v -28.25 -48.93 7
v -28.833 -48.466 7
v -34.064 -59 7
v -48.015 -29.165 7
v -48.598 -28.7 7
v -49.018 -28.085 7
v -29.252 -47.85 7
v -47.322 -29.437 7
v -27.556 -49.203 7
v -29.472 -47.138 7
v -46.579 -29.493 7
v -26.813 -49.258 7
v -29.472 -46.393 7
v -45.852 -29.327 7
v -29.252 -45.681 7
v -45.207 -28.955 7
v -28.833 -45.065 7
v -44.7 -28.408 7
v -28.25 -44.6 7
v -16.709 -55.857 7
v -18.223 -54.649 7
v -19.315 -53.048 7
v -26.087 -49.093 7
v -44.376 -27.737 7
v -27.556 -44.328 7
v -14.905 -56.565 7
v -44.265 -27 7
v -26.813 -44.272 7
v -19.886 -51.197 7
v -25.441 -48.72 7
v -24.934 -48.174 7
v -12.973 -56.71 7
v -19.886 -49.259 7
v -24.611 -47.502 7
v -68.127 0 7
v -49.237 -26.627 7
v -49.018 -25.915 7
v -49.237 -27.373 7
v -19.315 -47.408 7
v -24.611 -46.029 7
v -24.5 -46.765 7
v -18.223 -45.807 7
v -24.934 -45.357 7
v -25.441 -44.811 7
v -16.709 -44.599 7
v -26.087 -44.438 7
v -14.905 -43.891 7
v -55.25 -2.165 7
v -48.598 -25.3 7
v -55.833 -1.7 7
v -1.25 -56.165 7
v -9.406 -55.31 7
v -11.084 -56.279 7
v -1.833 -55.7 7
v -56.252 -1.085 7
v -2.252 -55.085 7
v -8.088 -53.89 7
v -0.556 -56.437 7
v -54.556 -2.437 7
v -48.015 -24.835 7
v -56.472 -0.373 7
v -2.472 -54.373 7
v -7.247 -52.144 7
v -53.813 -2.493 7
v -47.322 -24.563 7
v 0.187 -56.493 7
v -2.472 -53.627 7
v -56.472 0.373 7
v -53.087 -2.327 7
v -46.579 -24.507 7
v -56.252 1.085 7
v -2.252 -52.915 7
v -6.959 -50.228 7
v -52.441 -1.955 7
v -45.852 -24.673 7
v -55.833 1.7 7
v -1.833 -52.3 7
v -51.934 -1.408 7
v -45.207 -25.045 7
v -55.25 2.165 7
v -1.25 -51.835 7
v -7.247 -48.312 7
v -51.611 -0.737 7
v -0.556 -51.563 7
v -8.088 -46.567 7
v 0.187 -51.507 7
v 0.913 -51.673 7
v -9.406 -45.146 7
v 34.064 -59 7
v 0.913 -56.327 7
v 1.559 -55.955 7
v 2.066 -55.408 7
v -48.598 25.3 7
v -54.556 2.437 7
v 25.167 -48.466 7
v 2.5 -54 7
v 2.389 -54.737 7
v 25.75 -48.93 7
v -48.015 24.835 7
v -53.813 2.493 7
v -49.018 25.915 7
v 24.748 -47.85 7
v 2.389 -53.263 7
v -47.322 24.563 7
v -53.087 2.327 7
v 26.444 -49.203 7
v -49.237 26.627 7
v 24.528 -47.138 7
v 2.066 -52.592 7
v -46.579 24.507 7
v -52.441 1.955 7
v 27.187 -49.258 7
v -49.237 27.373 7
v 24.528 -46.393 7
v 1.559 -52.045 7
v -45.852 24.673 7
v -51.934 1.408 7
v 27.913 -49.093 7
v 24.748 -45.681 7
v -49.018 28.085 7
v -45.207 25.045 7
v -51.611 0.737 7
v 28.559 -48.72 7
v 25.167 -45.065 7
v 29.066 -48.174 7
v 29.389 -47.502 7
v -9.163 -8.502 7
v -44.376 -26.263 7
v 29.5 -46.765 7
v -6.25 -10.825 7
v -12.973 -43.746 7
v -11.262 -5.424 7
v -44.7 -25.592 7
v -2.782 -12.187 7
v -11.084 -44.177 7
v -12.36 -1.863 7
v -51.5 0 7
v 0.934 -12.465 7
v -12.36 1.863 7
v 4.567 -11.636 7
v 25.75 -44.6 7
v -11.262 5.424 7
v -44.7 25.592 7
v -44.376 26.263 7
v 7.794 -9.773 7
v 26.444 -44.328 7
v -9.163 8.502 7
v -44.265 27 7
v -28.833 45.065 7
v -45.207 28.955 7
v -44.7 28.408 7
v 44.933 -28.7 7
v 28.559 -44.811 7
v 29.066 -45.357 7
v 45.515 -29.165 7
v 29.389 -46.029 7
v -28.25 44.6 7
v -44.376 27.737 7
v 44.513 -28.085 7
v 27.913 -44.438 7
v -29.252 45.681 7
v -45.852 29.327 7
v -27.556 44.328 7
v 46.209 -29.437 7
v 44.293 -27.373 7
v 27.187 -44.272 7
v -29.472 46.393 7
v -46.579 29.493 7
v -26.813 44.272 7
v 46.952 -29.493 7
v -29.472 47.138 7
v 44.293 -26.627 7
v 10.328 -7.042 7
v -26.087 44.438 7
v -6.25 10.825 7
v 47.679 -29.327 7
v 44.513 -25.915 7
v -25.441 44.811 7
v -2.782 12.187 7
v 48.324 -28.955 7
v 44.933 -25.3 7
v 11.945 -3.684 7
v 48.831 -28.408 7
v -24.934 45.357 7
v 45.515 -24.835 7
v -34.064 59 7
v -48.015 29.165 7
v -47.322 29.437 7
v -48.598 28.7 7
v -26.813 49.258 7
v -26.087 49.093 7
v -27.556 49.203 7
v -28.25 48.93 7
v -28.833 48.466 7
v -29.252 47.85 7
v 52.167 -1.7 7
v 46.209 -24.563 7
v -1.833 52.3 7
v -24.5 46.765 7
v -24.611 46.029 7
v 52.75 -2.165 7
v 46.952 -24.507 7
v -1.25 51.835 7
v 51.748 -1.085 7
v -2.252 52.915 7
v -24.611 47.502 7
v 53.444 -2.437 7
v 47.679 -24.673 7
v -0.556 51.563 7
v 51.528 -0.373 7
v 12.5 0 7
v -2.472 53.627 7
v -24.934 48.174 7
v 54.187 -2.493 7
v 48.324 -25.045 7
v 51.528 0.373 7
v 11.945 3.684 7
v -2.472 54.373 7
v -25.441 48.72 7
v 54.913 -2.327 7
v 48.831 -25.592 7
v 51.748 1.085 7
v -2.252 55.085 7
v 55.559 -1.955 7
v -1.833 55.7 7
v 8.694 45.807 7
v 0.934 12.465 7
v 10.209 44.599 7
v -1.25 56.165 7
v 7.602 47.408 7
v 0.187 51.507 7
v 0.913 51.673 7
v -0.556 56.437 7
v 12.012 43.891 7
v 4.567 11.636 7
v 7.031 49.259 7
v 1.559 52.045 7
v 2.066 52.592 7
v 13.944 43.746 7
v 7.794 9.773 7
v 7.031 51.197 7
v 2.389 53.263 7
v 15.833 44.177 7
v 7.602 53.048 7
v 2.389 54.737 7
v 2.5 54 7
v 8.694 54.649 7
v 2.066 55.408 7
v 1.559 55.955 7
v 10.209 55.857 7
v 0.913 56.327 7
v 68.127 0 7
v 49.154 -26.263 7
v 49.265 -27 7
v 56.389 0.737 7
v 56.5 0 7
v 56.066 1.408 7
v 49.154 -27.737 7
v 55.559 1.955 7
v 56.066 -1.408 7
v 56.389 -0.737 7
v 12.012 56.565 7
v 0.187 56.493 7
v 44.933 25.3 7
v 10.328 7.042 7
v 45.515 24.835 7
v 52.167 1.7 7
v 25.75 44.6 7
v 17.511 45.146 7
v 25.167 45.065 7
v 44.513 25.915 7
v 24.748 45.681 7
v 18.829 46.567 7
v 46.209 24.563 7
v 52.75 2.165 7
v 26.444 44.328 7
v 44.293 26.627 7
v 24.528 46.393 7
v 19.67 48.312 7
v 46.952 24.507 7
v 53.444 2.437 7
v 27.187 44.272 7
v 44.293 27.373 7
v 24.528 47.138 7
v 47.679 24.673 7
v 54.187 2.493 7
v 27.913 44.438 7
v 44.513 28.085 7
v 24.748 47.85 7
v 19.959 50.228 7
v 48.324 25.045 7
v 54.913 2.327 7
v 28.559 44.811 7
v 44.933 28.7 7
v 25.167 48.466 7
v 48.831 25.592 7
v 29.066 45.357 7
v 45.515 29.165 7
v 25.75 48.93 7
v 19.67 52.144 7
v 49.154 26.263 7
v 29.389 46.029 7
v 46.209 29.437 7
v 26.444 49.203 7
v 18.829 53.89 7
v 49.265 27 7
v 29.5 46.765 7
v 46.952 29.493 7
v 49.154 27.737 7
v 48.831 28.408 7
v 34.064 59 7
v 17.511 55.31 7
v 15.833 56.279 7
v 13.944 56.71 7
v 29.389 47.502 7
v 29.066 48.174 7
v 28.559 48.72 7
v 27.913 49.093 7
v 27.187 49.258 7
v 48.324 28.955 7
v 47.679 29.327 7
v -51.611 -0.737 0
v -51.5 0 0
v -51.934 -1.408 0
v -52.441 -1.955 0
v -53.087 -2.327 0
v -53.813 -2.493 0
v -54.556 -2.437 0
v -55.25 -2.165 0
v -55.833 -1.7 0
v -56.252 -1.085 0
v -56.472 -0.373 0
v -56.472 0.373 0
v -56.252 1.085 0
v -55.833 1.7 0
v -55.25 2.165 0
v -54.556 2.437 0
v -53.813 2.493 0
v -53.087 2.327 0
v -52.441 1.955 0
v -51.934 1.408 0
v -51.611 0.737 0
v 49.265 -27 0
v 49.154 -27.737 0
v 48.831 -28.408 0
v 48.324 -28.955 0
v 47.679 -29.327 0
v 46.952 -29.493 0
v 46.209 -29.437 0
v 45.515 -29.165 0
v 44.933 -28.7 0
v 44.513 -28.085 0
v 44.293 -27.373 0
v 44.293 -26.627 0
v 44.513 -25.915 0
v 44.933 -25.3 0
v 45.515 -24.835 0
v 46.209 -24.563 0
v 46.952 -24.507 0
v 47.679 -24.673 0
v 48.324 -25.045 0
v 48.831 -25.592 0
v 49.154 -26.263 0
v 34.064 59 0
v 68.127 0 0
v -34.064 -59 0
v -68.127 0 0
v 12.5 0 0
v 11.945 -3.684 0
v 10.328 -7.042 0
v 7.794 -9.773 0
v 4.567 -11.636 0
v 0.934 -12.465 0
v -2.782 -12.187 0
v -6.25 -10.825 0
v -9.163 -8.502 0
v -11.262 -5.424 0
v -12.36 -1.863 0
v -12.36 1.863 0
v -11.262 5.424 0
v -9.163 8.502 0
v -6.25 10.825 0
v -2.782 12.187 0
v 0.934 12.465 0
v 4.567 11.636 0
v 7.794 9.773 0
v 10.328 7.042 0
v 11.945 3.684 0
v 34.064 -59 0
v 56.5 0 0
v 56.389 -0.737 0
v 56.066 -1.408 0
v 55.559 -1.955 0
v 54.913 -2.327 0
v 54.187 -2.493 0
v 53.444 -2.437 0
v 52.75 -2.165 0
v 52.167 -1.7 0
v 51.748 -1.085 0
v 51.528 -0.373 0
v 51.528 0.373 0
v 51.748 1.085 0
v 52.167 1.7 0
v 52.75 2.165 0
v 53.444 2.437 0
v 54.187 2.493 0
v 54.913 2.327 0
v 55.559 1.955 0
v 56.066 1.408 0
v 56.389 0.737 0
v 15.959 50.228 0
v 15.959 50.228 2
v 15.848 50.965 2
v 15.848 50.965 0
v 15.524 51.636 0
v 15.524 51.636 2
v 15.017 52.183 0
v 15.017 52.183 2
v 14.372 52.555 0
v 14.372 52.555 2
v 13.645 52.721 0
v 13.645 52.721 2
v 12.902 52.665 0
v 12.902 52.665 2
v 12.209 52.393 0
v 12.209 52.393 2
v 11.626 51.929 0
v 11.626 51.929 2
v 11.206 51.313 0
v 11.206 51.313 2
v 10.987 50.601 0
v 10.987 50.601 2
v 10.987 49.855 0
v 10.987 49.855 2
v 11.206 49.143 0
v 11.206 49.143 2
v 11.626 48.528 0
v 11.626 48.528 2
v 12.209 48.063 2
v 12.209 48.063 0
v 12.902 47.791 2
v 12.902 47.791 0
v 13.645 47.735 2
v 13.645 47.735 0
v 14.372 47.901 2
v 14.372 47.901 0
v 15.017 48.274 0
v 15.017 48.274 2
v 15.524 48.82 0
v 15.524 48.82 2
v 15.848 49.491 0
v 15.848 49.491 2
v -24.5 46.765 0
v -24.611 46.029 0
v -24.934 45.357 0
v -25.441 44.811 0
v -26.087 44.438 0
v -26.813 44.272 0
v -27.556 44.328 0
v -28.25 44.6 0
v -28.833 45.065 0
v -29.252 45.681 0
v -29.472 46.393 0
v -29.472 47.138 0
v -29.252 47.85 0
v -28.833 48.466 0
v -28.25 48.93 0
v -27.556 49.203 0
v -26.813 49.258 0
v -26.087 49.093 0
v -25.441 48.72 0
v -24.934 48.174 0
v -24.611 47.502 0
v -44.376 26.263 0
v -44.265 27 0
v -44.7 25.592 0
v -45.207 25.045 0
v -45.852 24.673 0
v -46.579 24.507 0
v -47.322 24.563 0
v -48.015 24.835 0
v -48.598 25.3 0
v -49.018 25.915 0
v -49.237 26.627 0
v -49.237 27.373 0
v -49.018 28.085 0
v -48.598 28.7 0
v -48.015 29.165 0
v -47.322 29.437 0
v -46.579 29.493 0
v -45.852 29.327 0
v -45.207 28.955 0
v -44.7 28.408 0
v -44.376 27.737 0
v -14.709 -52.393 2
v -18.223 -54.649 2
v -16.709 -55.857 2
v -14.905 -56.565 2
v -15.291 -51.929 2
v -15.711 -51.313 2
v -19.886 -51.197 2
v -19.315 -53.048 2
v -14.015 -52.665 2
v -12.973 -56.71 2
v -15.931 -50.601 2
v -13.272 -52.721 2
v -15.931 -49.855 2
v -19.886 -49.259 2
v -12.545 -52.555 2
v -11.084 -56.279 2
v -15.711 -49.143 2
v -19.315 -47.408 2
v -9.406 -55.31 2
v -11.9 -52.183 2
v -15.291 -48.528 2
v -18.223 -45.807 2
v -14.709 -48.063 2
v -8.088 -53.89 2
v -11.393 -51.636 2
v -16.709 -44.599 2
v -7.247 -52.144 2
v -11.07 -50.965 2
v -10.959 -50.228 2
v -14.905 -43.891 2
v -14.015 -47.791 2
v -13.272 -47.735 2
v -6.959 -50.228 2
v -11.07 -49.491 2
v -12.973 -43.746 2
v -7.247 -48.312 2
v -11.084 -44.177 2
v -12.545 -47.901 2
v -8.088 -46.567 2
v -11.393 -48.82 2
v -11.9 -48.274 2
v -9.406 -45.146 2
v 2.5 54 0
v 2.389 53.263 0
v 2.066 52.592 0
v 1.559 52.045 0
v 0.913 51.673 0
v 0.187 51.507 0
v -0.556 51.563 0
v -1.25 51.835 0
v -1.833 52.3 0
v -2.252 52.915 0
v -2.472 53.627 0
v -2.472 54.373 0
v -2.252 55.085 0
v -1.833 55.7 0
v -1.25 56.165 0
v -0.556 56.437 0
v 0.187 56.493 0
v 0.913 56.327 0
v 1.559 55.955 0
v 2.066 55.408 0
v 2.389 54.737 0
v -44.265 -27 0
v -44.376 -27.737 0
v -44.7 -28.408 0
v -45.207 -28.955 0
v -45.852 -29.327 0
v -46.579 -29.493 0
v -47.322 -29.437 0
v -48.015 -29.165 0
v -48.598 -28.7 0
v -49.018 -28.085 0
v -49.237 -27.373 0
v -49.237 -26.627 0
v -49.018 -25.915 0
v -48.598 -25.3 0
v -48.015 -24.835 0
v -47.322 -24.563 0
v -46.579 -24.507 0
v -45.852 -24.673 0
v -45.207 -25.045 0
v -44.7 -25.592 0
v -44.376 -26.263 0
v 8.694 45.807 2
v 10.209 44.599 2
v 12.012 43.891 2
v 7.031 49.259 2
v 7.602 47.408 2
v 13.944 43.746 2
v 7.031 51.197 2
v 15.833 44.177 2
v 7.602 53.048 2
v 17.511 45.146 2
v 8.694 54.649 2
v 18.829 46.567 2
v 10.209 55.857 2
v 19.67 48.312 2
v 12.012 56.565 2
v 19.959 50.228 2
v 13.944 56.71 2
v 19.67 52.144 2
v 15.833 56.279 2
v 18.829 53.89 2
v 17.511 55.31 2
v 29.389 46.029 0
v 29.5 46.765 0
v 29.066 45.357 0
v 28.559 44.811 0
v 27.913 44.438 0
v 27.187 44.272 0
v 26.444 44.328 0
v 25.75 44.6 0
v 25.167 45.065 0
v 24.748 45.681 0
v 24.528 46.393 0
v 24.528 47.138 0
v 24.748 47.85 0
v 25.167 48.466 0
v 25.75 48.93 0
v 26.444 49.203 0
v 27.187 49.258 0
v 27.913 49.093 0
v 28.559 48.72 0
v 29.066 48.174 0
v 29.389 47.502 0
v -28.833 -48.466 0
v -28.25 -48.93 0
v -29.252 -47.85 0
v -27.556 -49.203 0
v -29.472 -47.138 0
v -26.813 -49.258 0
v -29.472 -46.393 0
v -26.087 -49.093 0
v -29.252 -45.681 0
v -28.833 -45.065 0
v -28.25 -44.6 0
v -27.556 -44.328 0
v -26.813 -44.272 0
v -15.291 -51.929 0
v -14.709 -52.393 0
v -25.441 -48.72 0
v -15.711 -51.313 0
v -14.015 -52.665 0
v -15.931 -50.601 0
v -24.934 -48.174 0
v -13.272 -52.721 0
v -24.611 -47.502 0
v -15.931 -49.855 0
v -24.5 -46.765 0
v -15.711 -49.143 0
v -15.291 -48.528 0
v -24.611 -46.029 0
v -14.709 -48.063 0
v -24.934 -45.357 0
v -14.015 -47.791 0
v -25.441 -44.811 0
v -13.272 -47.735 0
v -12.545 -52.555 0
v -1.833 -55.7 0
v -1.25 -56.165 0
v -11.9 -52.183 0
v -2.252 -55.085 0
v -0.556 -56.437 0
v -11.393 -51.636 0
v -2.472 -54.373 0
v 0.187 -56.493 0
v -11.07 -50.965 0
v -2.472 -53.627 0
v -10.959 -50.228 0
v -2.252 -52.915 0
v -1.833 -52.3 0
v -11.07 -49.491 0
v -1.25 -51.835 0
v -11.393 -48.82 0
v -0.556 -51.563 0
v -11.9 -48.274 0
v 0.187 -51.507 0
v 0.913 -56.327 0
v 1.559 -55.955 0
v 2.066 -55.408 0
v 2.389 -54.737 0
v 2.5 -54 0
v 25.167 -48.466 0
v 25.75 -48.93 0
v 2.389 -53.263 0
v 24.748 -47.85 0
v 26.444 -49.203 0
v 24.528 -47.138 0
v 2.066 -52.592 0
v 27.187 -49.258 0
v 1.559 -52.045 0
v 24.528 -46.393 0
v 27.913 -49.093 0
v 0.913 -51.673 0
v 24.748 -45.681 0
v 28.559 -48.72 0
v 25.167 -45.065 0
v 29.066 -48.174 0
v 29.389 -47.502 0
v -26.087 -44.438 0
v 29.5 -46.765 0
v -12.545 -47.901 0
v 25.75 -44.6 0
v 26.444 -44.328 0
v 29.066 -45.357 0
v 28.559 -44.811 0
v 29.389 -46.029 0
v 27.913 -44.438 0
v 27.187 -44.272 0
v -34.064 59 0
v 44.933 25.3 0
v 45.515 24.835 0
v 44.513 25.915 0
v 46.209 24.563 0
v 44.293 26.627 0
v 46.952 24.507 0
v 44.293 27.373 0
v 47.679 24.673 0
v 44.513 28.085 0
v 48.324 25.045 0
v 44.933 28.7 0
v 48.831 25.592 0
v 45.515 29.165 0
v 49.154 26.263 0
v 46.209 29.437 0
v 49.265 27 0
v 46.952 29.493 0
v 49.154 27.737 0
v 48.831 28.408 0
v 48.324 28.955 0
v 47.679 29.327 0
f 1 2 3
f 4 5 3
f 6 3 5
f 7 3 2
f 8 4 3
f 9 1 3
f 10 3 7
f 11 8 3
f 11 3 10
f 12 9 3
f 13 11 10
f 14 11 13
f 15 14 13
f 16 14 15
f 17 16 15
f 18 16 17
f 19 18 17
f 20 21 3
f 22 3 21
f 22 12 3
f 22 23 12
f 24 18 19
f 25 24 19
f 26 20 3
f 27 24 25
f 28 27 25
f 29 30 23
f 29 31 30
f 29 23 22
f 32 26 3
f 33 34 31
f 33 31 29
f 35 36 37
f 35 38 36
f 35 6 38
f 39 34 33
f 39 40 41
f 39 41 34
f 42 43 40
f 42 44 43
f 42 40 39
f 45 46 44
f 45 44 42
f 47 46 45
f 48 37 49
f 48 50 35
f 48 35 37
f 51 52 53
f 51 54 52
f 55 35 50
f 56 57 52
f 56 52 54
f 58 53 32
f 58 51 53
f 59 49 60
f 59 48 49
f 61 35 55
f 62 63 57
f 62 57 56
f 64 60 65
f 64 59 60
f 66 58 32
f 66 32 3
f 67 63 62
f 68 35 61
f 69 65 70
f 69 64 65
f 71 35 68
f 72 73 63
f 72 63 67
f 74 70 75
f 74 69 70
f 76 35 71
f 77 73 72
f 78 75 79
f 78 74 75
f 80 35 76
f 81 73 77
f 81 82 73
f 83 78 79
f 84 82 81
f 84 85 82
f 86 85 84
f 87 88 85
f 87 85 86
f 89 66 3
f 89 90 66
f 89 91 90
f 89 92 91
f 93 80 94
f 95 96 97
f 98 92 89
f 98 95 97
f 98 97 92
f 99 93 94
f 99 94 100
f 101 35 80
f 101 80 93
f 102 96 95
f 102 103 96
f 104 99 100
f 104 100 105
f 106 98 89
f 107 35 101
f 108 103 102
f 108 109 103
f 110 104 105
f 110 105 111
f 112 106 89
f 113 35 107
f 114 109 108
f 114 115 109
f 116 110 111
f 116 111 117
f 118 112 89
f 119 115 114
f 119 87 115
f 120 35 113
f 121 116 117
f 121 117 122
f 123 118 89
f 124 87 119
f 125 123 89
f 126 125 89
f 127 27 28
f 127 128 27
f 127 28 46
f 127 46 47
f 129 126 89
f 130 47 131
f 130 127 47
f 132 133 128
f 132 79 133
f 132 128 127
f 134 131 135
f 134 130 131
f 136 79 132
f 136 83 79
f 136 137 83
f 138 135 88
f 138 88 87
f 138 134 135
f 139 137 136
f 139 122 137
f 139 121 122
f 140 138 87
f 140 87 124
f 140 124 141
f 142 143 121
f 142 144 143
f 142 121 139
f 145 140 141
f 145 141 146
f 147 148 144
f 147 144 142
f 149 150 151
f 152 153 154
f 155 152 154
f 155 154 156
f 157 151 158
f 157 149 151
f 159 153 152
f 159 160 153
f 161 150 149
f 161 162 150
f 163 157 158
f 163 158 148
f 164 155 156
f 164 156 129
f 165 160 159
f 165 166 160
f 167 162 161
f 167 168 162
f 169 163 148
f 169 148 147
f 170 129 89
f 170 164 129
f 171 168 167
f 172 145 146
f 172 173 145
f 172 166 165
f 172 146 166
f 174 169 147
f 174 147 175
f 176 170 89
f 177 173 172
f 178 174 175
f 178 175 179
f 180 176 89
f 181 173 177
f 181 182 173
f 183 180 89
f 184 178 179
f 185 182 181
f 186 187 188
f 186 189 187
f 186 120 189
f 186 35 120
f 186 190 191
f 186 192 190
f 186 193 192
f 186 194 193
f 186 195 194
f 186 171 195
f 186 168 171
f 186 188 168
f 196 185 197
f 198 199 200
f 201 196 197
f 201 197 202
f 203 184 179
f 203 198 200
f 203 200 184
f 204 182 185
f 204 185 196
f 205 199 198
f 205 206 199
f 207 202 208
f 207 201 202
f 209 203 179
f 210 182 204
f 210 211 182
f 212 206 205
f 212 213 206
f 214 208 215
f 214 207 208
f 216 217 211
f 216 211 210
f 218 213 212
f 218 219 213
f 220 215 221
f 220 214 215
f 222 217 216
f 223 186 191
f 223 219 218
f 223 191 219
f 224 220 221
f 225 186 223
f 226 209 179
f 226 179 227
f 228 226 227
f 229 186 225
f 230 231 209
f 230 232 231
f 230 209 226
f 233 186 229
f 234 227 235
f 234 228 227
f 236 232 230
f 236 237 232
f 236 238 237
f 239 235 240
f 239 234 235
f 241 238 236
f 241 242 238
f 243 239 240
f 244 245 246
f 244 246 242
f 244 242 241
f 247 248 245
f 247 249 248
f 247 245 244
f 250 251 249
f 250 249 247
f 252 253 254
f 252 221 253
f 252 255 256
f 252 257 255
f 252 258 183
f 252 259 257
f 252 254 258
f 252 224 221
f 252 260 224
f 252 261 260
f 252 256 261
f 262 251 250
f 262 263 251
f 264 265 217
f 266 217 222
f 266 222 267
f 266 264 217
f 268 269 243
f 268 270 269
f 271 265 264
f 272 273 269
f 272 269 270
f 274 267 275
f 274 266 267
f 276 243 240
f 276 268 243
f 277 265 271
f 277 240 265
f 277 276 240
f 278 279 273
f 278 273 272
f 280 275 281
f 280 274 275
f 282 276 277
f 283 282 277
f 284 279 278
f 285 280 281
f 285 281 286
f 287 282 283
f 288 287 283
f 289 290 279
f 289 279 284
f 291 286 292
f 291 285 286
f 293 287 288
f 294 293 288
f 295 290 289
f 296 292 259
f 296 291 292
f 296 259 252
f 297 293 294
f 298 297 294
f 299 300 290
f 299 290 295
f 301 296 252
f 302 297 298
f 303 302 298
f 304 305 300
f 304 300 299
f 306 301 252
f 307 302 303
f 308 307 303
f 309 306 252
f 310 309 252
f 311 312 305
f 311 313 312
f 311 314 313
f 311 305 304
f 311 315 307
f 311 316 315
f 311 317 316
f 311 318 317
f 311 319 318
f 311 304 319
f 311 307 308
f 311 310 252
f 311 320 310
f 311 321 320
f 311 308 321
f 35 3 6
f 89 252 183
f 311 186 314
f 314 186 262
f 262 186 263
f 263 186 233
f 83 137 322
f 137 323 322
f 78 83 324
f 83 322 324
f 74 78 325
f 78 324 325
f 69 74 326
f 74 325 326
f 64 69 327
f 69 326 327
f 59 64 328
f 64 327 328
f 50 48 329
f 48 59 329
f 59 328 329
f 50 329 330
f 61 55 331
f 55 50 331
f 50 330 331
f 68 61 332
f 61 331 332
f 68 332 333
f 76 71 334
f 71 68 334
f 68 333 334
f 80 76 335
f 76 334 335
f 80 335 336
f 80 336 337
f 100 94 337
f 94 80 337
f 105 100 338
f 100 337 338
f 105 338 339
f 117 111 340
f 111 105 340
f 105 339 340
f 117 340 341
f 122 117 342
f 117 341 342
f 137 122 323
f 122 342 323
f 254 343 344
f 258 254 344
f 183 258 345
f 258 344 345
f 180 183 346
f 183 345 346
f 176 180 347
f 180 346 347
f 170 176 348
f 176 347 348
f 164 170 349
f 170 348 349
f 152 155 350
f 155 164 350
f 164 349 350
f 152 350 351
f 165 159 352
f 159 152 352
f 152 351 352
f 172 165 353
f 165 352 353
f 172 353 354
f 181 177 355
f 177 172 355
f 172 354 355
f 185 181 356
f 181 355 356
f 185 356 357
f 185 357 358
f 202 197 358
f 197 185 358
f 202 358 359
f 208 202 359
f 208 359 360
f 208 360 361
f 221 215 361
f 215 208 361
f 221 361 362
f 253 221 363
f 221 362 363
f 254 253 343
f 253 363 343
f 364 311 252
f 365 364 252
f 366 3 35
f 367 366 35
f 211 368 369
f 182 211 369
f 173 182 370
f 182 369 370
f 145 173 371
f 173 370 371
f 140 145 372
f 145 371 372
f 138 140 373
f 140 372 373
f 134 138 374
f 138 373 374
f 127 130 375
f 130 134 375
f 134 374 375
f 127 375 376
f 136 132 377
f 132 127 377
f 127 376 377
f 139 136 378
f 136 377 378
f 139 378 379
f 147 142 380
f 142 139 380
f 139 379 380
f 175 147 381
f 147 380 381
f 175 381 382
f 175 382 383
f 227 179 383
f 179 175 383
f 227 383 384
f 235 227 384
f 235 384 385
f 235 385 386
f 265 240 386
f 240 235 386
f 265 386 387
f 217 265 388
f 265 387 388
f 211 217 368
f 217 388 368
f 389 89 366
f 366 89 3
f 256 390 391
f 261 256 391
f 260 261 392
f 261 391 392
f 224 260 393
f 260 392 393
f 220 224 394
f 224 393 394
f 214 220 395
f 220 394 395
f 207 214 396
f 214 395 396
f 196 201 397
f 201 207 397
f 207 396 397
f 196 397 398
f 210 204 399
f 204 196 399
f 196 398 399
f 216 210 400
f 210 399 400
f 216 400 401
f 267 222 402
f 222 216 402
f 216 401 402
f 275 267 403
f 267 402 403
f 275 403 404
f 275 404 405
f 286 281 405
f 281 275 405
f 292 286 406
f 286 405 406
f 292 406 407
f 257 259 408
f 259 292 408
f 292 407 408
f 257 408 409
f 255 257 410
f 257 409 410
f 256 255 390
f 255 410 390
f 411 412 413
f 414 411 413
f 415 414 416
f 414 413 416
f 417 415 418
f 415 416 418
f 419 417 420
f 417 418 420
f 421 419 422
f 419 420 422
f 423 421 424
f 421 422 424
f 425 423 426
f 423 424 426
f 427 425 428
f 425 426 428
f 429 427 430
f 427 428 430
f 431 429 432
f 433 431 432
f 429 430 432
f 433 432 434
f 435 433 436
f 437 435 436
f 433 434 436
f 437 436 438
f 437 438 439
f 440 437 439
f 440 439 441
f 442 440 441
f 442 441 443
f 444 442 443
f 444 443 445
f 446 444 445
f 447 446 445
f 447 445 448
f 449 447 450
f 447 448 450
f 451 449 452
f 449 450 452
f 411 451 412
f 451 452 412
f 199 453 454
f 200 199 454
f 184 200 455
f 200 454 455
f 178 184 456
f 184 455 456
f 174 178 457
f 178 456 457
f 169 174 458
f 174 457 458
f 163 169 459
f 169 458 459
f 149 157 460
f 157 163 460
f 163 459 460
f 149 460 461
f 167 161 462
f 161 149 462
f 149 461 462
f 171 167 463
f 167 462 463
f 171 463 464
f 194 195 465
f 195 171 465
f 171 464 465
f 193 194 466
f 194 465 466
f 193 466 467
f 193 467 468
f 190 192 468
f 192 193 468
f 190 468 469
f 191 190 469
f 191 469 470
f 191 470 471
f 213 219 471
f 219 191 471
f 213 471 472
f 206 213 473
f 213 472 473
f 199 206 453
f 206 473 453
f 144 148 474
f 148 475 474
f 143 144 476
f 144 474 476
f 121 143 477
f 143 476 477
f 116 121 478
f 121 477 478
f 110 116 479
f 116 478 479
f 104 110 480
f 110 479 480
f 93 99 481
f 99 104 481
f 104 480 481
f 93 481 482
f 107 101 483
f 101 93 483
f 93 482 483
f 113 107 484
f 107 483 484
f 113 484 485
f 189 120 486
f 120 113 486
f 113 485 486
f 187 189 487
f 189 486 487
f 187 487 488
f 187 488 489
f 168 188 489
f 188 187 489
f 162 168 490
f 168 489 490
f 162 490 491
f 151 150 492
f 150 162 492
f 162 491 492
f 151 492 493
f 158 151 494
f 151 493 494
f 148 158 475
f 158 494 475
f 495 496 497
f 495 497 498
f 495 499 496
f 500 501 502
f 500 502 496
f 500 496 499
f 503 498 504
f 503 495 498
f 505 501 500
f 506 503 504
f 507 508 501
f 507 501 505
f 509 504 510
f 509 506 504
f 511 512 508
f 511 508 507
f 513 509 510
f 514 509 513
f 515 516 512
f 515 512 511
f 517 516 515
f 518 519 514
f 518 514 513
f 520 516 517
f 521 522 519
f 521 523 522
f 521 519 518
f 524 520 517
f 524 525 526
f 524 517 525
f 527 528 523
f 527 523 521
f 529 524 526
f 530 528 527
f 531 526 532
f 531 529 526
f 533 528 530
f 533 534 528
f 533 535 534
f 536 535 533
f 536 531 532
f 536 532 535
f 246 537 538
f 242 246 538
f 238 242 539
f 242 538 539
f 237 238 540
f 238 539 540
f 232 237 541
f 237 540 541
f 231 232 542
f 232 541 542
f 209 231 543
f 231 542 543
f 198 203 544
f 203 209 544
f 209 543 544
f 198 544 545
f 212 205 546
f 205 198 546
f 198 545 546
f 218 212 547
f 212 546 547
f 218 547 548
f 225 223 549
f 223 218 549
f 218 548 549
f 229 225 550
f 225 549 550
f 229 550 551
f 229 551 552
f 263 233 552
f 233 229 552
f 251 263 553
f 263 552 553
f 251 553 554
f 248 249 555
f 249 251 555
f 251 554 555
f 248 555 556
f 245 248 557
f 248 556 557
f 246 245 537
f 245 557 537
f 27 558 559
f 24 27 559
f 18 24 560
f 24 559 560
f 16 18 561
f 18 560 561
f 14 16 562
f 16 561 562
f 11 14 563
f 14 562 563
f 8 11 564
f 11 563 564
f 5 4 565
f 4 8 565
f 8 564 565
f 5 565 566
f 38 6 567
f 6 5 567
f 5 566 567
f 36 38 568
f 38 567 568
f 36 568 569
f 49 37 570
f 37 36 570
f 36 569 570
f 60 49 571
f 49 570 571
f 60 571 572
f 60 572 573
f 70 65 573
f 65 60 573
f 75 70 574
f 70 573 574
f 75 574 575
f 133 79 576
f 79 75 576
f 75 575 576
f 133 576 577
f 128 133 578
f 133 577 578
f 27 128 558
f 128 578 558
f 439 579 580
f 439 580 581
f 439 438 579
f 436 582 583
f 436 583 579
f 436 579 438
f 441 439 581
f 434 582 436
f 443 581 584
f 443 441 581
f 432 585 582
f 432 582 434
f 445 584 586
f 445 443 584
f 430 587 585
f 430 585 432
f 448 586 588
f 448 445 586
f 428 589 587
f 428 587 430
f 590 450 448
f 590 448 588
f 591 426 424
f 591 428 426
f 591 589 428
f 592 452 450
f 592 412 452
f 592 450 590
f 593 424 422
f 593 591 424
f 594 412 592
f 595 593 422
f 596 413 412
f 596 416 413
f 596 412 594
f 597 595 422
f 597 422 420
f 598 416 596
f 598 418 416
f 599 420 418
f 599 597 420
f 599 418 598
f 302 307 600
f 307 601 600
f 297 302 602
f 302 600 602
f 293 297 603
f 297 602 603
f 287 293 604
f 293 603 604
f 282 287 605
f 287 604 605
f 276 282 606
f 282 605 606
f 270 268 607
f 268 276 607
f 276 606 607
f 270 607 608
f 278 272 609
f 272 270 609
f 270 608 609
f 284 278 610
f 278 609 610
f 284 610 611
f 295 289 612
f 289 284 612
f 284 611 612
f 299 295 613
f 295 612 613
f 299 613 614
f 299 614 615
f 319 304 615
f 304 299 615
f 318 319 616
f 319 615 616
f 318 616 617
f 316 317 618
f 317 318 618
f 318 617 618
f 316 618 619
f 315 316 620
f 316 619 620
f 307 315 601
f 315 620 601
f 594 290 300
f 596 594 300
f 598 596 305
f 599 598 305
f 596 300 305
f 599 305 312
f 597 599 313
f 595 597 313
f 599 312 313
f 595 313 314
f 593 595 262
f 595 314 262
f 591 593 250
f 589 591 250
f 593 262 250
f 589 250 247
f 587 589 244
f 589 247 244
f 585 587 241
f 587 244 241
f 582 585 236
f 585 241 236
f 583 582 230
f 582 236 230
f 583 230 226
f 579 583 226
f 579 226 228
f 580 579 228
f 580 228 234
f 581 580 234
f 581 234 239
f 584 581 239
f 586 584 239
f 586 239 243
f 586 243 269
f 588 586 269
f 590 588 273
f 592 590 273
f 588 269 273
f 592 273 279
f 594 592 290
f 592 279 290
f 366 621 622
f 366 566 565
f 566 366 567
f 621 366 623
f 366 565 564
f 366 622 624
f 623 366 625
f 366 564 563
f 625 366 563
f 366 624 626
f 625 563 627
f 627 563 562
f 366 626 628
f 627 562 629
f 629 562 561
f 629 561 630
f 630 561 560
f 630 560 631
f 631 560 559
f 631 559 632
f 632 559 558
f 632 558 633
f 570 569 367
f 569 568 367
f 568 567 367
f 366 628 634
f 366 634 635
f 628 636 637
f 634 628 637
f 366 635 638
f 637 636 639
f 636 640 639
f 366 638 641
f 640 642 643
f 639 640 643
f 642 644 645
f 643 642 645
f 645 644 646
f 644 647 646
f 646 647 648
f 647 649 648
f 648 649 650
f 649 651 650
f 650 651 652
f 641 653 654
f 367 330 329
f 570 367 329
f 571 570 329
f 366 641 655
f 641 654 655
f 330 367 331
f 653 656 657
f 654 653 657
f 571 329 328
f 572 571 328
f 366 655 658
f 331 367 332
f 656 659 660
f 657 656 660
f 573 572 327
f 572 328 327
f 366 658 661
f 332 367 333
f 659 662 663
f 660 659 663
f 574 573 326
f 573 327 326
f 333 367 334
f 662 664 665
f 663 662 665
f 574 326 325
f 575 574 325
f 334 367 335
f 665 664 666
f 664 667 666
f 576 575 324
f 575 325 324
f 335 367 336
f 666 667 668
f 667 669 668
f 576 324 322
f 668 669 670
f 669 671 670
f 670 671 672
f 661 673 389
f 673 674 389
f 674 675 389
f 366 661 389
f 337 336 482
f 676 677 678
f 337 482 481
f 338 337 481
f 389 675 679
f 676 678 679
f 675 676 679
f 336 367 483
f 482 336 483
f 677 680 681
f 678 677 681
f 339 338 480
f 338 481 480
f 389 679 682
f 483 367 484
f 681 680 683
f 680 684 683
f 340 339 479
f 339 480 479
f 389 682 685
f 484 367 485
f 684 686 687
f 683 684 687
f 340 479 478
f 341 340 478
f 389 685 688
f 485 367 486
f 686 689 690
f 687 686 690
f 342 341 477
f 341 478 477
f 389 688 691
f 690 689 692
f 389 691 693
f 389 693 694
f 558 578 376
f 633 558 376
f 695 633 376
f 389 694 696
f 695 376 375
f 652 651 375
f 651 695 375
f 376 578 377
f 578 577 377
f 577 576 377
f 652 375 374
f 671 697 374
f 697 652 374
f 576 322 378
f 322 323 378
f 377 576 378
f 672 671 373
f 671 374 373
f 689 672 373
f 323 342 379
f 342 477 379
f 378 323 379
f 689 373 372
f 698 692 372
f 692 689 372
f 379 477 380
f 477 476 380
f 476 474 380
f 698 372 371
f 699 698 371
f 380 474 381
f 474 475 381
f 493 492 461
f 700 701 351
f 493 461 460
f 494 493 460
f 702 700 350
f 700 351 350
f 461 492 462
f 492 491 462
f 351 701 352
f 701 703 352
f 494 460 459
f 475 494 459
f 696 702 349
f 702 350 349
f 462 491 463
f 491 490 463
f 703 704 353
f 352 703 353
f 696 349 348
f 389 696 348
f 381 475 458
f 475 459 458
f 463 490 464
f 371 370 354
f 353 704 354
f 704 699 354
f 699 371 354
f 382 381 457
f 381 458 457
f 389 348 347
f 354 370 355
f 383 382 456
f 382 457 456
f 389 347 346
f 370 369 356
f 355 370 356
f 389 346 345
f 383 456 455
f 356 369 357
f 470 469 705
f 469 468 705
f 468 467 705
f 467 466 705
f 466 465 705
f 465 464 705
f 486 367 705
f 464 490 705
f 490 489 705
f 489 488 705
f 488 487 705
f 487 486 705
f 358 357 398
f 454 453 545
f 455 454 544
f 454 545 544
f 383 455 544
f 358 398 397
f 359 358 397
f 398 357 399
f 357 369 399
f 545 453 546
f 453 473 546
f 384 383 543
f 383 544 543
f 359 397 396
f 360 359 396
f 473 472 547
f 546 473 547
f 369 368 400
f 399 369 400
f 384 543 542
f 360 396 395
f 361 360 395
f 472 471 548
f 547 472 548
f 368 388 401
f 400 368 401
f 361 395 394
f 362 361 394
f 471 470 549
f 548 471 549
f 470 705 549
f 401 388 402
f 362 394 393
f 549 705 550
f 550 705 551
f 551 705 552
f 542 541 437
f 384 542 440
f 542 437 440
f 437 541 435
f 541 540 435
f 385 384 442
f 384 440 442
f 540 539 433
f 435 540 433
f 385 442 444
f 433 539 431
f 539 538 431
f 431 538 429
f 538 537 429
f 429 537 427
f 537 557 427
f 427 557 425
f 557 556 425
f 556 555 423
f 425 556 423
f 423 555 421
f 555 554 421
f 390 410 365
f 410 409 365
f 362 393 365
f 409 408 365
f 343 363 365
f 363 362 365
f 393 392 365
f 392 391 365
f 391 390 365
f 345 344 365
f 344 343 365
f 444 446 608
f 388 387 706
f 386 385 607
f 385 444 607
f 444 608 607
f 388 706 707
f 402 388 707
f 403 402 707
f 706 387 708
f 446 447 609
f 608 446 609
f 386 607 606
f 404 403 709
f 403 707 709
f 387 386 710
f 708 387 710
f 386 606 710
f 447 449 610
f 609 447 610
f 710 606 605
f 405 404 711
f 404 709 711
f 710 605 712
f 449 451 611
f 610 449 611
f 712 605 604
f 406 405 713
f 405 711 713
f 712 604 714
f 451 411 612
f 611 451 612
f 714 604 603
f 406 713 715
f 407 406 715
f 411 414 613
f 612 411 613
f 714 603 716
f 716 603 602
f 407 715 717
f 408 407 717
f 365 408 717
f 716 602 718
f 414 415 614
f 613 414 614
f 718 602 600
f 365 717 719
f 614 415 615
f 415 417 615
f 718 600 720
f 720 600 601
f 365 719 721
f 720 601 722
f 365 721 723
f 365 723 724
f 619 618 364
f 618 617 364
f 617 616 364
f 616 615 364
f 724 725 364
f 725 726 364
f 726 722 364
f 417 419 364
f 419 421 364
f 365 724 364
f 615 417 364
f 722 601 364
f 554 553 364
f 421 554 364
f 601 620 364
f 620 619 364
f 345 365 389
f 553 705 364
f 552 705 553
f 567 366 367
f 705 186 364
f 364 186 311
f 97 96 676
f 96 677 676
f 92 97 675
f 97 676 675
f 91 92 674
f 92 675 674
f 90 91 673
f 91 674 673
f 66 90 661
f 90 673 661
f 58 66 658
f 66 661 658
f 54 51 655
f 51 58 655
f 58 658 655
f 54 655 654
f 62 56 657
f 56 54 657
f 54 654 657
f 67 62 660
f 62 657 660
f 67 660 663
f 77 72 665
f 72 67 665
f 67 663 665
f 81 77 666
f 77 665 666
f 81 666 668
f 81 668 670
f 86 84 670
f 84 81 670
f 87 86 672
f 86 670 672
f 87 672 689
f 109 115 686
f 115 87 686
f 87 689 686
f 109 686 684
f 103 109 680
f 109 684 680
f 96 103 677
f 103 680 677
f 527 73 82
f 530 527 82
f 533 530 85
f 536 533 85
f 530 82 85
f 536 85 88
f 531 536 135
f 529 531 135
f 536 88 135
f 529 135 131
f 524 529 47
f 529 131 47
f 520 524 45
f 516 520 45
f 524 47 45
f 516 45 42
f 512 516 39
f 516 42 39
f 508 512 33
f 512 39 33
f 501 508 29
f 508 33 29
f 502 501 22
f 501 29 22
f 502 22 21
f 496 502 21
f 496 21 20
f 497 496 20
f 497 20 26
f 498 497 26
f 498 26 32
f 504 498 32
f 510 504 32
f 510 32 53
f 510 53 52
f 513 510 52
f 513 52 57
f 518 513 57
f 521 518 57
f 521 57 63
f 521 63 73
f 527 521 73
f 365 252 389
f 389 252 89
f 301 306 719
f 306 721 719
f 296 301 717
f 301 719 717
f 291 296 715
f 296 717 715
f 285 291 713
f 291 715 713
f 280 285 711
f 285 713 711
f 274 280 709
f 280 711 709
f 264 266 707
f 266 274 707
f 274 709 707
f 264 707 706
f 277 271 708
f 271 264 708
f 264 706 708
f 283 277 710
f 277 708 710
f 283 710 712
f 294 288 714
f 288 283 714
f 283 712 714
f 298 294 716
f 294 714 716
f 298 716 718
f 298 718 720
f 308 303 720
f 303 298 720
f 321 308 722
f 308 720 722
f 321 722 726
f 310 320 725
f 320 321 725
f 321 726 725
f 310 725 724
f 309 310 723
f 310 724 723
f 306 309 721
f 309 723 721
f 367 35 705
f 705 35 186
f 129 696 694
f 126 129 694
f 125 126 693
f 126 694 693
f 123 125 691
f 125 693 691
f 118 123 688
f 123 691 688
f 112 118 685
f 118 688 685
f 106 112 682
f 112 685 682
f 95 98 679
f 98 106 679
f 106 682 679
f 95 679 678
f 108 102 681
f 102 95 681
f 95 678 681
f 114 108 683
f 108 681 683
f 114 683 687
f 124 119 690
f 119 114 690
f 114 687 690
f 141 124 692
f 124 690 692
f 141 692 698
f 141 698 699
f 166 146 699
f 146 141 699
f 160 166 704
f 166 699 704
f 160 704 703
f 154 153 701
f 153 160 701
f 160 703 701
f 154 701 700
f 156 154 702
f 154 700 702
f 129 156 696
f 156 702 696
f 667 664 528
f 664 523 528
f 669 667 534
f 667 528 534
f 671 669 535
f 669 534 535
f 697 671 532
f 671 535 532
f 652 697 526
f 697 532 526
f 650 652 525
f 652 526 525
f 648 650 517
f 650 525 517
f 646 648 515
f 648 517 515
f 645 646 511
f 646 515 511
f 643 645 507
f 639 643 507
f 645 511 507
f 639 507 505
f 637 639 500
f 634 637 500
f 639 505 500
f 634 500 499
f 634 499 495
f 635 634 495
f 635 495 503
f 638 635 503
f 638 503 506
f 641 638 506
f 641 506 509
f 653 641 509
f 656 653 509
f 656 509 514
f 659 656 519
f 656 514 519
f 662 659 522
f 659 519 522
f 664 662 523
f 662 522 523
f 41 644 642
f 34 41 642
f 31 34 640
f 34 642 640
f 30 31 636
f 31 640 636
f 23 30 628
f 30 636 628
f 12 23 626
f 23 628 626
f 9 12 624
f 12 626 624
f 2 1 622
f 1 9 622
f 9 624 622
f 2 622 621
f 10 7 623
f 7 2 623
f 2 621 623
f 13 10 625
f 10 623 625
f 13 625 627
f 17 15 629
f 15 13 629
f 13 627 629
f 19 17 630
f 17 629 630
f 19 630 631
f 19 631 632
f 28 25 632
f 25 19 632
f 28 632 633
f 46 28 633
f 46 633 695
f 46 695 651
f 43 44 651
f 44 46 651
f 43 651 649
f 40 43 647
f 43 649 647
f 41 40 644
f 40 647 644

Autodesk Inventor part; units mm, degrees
ref_plane "YZ Plane" through (0, 0, 0) normal (1, 0, 0) x (0, 1, 0)
ref_plane "XZ Plane" through (0, 0, 0) normal (0, 1, 0) x (-1, 0, 0)
ref_plane "XY Plane" through (0, 0, 0) normal (0, 0, 1) x (1, 0, 0)
sketch "Sketch1" plane through (0, 0, 0) normal (0, 0, 1) x (1, 0, 0)
  line L0 (77.9423, 0) -> (38.9711, -67.5)
  line L1 (38.9711, -67.5) -> (-38.9711, -67.5)
  line L2 (-38.9711, -67.5) -> (-77.9423, 0)
  line L3 (-77.9423, 0) -> (-38.9711, 67.5)
  line L4 (-38.9711, 67.5) -> (38.9711, 67.5)
  line L5 (38.9711, 67.5) -> (77.9423, 0)
  circle A0 centre (0, 0) radius 12.5
  circle A1 centre (54, 0) radius 2.5
  circle A2 centre (46.7654, 27) radius 2.5
  circle A3 centre (27, 46.7654) radius 2.5
  circle A4 centre (0, 54) radius 2.5
  circle A5 centre (-27, 46.7654) radius 2.5
  circle A6 centre (-46.7654, 27) radius 2.5
  circle A7 centre (-54, 0) radius 2.5
  circle A8 centre (-46.7654, -27) radius 2.5
  circle A9 centre (-27, -46.7654) radius 2.5
  circle A10 centre (0, -54) radius 2.5
  circle A11 centre (27, -46.7654) radius 2.5
  circle A12 centre (46.7654, -27) radius 2.5
  dimension "d0" = 135
  dimension "d1" = 25
  dimension "d2" = 54
  dimension "d3" = 5
  dimension "d6" = 360
extrude "Extrusion1" add sketch "Sketch1" along normal blind 7
sketch "Sketch5" plane through (0, 0, 7) normal (0, 0, 1) x (1, 0, 0)
  circle A0 centre (0, 0) radius 12.5 projected
  circle A1 centre (46.7654, -27) radius 2.5 projected
  circle A2 centre (27, -46.7654) radius 2.5 projected
  circle A3 centre (-27, -46.7654) radius 2.5 projected
  circle A4 centre (-46.7654, -27) radius 2.5 projected
  circle A5 centre (-54, 0) radius 2.5 projected
  circle A6 centre (-46.7654, 27) radius 2.5 projected
  circle A7 centre (-27, 46.7654) radius 2.5 projected
  circle A8 centre (27, 46.7654) radius 2.5 projected
  circle A9 centre (46.7654, 27) radius 2.5 projected
  circle A10 centre (54, 0) radius 2.5 projected
  line L0 (38.9711, -67.5) -> (77.9423, 0) projected
  line L1 (77.9423, 0) -> (38.9711, 67.5) projected
  line L2 (38.9711, 67.5) -> (-38.9711, 67.5) projected
  line L3 (-38.9711, 67.5) -> (-77.9423, 0) projected
  line L4 (-77.9423, 0) -> (-38.9711, -67.5) projected
  line L5 (-38.9711, -67.5) -> (38.9711, -67.5) projected
  line L6 (-68.1273, 0) -> (-34.0637, 59)
  line L7 (-34.0637, 59) -> (34.0637, 59)
  line L8 (34.0637, 59) -> (68.1273, 0)
  line L9 (68.1273, 0) -> (34.0637, -59)
  line L10 (34.0637, -59) -> (-34.0637, -59)
  line L11 (-34.0637, -59) -> (-68.1273, 0)
  dimension "d30" = 118
extrude "Extrusion5" cut sketch "Sketch5" against normal through all contours L5 L4 L3 L2 L1 L0
sketch "Sketch6" plane through (0, 0, 7) normal (0, 0, 1) x (1, 0, 0)
  circle A0 centre (0, 52) radius 2.5
  circle A1 centre (-13.4586, 50.2281) radius 2.5
  circle A2 centre (-26, 45.0333) radius 2.5
  circle A3 centre (-36.7696, 36.7696) radius 2.5
  circle A4 centre (-45.0333, 26) radius 2.5
  circle A5 centre (-50.2281, 13.4586) radius 2.5
  circle A6 centre (-52, 0) radius 2.5
  circle A7 centre (-50.2281, -13.4586) radius 2.5
  circle A8 centre (-45.0333, -26) radius 2.5
  circle A9 centre (-36.7696, -36.7696) radius 2.5
  circle A10 centre (-26, -45.0333) radius 2.5
  circle A11 centre (-13.4586, -50.2281) radius 2.5
  circle A12 centre (0, -52) radius 2.5
  circle A13 centre (13.4586, -50.2281) radius 2.5
  circle A14 centre (26, -45.0333) radius 2.5
  circle A15 centre (36.7696, -36.7696) radius 2.5
  circle A16 centre (45.0333, -26) radius 2.5
  circle A17 centre (50.2281, -13.4586) radius 2.5
  circle A18 centre (52, 0) radius 2.5
  circle A19 centre (50.2281, 13.4586) radius 2.5
  circle A20 centre (45.0333, 26) radius 2.5
  circle A21 centre (36.7696, 36.7696) radius 2.5
  circle A22 centre (26, 45.0333) radius 2.5
  circle A23 centre (13.4586, 50.2281) radius 2.5
  point P0 (0, 0)
  dimension "d35" = 5
  dimension "d38" = 360
  dimension "d40" = 52
extrude "Extrusion6" cut sketch "Sketch6" against normal through all contours A11 | A23
sketch "Sketch7" plane through (0, 0, 7) normal (0, 0, 1) x (1, 0, 0)
  circle A0 centre (13.4586, 50.2281) radius 2.5 projected
  circle A1 centre (-13.4586, -50.2281) radius 2.5 projected
  circle A2 centre (13.4586, 50.2281) radius 6.5
  circle A3 centre (-13.4586, -50.2281) radius 6.5
  point P0 (0, 0)
  dimension "d43" = 13
  dimension "d44" = 13
extrude "Extrusion7" cut sketch "Sketch7" against normal blind 5 contours A0 | A1 | A2 | A3
properties part number "AC04" material "ABS Plastic"
